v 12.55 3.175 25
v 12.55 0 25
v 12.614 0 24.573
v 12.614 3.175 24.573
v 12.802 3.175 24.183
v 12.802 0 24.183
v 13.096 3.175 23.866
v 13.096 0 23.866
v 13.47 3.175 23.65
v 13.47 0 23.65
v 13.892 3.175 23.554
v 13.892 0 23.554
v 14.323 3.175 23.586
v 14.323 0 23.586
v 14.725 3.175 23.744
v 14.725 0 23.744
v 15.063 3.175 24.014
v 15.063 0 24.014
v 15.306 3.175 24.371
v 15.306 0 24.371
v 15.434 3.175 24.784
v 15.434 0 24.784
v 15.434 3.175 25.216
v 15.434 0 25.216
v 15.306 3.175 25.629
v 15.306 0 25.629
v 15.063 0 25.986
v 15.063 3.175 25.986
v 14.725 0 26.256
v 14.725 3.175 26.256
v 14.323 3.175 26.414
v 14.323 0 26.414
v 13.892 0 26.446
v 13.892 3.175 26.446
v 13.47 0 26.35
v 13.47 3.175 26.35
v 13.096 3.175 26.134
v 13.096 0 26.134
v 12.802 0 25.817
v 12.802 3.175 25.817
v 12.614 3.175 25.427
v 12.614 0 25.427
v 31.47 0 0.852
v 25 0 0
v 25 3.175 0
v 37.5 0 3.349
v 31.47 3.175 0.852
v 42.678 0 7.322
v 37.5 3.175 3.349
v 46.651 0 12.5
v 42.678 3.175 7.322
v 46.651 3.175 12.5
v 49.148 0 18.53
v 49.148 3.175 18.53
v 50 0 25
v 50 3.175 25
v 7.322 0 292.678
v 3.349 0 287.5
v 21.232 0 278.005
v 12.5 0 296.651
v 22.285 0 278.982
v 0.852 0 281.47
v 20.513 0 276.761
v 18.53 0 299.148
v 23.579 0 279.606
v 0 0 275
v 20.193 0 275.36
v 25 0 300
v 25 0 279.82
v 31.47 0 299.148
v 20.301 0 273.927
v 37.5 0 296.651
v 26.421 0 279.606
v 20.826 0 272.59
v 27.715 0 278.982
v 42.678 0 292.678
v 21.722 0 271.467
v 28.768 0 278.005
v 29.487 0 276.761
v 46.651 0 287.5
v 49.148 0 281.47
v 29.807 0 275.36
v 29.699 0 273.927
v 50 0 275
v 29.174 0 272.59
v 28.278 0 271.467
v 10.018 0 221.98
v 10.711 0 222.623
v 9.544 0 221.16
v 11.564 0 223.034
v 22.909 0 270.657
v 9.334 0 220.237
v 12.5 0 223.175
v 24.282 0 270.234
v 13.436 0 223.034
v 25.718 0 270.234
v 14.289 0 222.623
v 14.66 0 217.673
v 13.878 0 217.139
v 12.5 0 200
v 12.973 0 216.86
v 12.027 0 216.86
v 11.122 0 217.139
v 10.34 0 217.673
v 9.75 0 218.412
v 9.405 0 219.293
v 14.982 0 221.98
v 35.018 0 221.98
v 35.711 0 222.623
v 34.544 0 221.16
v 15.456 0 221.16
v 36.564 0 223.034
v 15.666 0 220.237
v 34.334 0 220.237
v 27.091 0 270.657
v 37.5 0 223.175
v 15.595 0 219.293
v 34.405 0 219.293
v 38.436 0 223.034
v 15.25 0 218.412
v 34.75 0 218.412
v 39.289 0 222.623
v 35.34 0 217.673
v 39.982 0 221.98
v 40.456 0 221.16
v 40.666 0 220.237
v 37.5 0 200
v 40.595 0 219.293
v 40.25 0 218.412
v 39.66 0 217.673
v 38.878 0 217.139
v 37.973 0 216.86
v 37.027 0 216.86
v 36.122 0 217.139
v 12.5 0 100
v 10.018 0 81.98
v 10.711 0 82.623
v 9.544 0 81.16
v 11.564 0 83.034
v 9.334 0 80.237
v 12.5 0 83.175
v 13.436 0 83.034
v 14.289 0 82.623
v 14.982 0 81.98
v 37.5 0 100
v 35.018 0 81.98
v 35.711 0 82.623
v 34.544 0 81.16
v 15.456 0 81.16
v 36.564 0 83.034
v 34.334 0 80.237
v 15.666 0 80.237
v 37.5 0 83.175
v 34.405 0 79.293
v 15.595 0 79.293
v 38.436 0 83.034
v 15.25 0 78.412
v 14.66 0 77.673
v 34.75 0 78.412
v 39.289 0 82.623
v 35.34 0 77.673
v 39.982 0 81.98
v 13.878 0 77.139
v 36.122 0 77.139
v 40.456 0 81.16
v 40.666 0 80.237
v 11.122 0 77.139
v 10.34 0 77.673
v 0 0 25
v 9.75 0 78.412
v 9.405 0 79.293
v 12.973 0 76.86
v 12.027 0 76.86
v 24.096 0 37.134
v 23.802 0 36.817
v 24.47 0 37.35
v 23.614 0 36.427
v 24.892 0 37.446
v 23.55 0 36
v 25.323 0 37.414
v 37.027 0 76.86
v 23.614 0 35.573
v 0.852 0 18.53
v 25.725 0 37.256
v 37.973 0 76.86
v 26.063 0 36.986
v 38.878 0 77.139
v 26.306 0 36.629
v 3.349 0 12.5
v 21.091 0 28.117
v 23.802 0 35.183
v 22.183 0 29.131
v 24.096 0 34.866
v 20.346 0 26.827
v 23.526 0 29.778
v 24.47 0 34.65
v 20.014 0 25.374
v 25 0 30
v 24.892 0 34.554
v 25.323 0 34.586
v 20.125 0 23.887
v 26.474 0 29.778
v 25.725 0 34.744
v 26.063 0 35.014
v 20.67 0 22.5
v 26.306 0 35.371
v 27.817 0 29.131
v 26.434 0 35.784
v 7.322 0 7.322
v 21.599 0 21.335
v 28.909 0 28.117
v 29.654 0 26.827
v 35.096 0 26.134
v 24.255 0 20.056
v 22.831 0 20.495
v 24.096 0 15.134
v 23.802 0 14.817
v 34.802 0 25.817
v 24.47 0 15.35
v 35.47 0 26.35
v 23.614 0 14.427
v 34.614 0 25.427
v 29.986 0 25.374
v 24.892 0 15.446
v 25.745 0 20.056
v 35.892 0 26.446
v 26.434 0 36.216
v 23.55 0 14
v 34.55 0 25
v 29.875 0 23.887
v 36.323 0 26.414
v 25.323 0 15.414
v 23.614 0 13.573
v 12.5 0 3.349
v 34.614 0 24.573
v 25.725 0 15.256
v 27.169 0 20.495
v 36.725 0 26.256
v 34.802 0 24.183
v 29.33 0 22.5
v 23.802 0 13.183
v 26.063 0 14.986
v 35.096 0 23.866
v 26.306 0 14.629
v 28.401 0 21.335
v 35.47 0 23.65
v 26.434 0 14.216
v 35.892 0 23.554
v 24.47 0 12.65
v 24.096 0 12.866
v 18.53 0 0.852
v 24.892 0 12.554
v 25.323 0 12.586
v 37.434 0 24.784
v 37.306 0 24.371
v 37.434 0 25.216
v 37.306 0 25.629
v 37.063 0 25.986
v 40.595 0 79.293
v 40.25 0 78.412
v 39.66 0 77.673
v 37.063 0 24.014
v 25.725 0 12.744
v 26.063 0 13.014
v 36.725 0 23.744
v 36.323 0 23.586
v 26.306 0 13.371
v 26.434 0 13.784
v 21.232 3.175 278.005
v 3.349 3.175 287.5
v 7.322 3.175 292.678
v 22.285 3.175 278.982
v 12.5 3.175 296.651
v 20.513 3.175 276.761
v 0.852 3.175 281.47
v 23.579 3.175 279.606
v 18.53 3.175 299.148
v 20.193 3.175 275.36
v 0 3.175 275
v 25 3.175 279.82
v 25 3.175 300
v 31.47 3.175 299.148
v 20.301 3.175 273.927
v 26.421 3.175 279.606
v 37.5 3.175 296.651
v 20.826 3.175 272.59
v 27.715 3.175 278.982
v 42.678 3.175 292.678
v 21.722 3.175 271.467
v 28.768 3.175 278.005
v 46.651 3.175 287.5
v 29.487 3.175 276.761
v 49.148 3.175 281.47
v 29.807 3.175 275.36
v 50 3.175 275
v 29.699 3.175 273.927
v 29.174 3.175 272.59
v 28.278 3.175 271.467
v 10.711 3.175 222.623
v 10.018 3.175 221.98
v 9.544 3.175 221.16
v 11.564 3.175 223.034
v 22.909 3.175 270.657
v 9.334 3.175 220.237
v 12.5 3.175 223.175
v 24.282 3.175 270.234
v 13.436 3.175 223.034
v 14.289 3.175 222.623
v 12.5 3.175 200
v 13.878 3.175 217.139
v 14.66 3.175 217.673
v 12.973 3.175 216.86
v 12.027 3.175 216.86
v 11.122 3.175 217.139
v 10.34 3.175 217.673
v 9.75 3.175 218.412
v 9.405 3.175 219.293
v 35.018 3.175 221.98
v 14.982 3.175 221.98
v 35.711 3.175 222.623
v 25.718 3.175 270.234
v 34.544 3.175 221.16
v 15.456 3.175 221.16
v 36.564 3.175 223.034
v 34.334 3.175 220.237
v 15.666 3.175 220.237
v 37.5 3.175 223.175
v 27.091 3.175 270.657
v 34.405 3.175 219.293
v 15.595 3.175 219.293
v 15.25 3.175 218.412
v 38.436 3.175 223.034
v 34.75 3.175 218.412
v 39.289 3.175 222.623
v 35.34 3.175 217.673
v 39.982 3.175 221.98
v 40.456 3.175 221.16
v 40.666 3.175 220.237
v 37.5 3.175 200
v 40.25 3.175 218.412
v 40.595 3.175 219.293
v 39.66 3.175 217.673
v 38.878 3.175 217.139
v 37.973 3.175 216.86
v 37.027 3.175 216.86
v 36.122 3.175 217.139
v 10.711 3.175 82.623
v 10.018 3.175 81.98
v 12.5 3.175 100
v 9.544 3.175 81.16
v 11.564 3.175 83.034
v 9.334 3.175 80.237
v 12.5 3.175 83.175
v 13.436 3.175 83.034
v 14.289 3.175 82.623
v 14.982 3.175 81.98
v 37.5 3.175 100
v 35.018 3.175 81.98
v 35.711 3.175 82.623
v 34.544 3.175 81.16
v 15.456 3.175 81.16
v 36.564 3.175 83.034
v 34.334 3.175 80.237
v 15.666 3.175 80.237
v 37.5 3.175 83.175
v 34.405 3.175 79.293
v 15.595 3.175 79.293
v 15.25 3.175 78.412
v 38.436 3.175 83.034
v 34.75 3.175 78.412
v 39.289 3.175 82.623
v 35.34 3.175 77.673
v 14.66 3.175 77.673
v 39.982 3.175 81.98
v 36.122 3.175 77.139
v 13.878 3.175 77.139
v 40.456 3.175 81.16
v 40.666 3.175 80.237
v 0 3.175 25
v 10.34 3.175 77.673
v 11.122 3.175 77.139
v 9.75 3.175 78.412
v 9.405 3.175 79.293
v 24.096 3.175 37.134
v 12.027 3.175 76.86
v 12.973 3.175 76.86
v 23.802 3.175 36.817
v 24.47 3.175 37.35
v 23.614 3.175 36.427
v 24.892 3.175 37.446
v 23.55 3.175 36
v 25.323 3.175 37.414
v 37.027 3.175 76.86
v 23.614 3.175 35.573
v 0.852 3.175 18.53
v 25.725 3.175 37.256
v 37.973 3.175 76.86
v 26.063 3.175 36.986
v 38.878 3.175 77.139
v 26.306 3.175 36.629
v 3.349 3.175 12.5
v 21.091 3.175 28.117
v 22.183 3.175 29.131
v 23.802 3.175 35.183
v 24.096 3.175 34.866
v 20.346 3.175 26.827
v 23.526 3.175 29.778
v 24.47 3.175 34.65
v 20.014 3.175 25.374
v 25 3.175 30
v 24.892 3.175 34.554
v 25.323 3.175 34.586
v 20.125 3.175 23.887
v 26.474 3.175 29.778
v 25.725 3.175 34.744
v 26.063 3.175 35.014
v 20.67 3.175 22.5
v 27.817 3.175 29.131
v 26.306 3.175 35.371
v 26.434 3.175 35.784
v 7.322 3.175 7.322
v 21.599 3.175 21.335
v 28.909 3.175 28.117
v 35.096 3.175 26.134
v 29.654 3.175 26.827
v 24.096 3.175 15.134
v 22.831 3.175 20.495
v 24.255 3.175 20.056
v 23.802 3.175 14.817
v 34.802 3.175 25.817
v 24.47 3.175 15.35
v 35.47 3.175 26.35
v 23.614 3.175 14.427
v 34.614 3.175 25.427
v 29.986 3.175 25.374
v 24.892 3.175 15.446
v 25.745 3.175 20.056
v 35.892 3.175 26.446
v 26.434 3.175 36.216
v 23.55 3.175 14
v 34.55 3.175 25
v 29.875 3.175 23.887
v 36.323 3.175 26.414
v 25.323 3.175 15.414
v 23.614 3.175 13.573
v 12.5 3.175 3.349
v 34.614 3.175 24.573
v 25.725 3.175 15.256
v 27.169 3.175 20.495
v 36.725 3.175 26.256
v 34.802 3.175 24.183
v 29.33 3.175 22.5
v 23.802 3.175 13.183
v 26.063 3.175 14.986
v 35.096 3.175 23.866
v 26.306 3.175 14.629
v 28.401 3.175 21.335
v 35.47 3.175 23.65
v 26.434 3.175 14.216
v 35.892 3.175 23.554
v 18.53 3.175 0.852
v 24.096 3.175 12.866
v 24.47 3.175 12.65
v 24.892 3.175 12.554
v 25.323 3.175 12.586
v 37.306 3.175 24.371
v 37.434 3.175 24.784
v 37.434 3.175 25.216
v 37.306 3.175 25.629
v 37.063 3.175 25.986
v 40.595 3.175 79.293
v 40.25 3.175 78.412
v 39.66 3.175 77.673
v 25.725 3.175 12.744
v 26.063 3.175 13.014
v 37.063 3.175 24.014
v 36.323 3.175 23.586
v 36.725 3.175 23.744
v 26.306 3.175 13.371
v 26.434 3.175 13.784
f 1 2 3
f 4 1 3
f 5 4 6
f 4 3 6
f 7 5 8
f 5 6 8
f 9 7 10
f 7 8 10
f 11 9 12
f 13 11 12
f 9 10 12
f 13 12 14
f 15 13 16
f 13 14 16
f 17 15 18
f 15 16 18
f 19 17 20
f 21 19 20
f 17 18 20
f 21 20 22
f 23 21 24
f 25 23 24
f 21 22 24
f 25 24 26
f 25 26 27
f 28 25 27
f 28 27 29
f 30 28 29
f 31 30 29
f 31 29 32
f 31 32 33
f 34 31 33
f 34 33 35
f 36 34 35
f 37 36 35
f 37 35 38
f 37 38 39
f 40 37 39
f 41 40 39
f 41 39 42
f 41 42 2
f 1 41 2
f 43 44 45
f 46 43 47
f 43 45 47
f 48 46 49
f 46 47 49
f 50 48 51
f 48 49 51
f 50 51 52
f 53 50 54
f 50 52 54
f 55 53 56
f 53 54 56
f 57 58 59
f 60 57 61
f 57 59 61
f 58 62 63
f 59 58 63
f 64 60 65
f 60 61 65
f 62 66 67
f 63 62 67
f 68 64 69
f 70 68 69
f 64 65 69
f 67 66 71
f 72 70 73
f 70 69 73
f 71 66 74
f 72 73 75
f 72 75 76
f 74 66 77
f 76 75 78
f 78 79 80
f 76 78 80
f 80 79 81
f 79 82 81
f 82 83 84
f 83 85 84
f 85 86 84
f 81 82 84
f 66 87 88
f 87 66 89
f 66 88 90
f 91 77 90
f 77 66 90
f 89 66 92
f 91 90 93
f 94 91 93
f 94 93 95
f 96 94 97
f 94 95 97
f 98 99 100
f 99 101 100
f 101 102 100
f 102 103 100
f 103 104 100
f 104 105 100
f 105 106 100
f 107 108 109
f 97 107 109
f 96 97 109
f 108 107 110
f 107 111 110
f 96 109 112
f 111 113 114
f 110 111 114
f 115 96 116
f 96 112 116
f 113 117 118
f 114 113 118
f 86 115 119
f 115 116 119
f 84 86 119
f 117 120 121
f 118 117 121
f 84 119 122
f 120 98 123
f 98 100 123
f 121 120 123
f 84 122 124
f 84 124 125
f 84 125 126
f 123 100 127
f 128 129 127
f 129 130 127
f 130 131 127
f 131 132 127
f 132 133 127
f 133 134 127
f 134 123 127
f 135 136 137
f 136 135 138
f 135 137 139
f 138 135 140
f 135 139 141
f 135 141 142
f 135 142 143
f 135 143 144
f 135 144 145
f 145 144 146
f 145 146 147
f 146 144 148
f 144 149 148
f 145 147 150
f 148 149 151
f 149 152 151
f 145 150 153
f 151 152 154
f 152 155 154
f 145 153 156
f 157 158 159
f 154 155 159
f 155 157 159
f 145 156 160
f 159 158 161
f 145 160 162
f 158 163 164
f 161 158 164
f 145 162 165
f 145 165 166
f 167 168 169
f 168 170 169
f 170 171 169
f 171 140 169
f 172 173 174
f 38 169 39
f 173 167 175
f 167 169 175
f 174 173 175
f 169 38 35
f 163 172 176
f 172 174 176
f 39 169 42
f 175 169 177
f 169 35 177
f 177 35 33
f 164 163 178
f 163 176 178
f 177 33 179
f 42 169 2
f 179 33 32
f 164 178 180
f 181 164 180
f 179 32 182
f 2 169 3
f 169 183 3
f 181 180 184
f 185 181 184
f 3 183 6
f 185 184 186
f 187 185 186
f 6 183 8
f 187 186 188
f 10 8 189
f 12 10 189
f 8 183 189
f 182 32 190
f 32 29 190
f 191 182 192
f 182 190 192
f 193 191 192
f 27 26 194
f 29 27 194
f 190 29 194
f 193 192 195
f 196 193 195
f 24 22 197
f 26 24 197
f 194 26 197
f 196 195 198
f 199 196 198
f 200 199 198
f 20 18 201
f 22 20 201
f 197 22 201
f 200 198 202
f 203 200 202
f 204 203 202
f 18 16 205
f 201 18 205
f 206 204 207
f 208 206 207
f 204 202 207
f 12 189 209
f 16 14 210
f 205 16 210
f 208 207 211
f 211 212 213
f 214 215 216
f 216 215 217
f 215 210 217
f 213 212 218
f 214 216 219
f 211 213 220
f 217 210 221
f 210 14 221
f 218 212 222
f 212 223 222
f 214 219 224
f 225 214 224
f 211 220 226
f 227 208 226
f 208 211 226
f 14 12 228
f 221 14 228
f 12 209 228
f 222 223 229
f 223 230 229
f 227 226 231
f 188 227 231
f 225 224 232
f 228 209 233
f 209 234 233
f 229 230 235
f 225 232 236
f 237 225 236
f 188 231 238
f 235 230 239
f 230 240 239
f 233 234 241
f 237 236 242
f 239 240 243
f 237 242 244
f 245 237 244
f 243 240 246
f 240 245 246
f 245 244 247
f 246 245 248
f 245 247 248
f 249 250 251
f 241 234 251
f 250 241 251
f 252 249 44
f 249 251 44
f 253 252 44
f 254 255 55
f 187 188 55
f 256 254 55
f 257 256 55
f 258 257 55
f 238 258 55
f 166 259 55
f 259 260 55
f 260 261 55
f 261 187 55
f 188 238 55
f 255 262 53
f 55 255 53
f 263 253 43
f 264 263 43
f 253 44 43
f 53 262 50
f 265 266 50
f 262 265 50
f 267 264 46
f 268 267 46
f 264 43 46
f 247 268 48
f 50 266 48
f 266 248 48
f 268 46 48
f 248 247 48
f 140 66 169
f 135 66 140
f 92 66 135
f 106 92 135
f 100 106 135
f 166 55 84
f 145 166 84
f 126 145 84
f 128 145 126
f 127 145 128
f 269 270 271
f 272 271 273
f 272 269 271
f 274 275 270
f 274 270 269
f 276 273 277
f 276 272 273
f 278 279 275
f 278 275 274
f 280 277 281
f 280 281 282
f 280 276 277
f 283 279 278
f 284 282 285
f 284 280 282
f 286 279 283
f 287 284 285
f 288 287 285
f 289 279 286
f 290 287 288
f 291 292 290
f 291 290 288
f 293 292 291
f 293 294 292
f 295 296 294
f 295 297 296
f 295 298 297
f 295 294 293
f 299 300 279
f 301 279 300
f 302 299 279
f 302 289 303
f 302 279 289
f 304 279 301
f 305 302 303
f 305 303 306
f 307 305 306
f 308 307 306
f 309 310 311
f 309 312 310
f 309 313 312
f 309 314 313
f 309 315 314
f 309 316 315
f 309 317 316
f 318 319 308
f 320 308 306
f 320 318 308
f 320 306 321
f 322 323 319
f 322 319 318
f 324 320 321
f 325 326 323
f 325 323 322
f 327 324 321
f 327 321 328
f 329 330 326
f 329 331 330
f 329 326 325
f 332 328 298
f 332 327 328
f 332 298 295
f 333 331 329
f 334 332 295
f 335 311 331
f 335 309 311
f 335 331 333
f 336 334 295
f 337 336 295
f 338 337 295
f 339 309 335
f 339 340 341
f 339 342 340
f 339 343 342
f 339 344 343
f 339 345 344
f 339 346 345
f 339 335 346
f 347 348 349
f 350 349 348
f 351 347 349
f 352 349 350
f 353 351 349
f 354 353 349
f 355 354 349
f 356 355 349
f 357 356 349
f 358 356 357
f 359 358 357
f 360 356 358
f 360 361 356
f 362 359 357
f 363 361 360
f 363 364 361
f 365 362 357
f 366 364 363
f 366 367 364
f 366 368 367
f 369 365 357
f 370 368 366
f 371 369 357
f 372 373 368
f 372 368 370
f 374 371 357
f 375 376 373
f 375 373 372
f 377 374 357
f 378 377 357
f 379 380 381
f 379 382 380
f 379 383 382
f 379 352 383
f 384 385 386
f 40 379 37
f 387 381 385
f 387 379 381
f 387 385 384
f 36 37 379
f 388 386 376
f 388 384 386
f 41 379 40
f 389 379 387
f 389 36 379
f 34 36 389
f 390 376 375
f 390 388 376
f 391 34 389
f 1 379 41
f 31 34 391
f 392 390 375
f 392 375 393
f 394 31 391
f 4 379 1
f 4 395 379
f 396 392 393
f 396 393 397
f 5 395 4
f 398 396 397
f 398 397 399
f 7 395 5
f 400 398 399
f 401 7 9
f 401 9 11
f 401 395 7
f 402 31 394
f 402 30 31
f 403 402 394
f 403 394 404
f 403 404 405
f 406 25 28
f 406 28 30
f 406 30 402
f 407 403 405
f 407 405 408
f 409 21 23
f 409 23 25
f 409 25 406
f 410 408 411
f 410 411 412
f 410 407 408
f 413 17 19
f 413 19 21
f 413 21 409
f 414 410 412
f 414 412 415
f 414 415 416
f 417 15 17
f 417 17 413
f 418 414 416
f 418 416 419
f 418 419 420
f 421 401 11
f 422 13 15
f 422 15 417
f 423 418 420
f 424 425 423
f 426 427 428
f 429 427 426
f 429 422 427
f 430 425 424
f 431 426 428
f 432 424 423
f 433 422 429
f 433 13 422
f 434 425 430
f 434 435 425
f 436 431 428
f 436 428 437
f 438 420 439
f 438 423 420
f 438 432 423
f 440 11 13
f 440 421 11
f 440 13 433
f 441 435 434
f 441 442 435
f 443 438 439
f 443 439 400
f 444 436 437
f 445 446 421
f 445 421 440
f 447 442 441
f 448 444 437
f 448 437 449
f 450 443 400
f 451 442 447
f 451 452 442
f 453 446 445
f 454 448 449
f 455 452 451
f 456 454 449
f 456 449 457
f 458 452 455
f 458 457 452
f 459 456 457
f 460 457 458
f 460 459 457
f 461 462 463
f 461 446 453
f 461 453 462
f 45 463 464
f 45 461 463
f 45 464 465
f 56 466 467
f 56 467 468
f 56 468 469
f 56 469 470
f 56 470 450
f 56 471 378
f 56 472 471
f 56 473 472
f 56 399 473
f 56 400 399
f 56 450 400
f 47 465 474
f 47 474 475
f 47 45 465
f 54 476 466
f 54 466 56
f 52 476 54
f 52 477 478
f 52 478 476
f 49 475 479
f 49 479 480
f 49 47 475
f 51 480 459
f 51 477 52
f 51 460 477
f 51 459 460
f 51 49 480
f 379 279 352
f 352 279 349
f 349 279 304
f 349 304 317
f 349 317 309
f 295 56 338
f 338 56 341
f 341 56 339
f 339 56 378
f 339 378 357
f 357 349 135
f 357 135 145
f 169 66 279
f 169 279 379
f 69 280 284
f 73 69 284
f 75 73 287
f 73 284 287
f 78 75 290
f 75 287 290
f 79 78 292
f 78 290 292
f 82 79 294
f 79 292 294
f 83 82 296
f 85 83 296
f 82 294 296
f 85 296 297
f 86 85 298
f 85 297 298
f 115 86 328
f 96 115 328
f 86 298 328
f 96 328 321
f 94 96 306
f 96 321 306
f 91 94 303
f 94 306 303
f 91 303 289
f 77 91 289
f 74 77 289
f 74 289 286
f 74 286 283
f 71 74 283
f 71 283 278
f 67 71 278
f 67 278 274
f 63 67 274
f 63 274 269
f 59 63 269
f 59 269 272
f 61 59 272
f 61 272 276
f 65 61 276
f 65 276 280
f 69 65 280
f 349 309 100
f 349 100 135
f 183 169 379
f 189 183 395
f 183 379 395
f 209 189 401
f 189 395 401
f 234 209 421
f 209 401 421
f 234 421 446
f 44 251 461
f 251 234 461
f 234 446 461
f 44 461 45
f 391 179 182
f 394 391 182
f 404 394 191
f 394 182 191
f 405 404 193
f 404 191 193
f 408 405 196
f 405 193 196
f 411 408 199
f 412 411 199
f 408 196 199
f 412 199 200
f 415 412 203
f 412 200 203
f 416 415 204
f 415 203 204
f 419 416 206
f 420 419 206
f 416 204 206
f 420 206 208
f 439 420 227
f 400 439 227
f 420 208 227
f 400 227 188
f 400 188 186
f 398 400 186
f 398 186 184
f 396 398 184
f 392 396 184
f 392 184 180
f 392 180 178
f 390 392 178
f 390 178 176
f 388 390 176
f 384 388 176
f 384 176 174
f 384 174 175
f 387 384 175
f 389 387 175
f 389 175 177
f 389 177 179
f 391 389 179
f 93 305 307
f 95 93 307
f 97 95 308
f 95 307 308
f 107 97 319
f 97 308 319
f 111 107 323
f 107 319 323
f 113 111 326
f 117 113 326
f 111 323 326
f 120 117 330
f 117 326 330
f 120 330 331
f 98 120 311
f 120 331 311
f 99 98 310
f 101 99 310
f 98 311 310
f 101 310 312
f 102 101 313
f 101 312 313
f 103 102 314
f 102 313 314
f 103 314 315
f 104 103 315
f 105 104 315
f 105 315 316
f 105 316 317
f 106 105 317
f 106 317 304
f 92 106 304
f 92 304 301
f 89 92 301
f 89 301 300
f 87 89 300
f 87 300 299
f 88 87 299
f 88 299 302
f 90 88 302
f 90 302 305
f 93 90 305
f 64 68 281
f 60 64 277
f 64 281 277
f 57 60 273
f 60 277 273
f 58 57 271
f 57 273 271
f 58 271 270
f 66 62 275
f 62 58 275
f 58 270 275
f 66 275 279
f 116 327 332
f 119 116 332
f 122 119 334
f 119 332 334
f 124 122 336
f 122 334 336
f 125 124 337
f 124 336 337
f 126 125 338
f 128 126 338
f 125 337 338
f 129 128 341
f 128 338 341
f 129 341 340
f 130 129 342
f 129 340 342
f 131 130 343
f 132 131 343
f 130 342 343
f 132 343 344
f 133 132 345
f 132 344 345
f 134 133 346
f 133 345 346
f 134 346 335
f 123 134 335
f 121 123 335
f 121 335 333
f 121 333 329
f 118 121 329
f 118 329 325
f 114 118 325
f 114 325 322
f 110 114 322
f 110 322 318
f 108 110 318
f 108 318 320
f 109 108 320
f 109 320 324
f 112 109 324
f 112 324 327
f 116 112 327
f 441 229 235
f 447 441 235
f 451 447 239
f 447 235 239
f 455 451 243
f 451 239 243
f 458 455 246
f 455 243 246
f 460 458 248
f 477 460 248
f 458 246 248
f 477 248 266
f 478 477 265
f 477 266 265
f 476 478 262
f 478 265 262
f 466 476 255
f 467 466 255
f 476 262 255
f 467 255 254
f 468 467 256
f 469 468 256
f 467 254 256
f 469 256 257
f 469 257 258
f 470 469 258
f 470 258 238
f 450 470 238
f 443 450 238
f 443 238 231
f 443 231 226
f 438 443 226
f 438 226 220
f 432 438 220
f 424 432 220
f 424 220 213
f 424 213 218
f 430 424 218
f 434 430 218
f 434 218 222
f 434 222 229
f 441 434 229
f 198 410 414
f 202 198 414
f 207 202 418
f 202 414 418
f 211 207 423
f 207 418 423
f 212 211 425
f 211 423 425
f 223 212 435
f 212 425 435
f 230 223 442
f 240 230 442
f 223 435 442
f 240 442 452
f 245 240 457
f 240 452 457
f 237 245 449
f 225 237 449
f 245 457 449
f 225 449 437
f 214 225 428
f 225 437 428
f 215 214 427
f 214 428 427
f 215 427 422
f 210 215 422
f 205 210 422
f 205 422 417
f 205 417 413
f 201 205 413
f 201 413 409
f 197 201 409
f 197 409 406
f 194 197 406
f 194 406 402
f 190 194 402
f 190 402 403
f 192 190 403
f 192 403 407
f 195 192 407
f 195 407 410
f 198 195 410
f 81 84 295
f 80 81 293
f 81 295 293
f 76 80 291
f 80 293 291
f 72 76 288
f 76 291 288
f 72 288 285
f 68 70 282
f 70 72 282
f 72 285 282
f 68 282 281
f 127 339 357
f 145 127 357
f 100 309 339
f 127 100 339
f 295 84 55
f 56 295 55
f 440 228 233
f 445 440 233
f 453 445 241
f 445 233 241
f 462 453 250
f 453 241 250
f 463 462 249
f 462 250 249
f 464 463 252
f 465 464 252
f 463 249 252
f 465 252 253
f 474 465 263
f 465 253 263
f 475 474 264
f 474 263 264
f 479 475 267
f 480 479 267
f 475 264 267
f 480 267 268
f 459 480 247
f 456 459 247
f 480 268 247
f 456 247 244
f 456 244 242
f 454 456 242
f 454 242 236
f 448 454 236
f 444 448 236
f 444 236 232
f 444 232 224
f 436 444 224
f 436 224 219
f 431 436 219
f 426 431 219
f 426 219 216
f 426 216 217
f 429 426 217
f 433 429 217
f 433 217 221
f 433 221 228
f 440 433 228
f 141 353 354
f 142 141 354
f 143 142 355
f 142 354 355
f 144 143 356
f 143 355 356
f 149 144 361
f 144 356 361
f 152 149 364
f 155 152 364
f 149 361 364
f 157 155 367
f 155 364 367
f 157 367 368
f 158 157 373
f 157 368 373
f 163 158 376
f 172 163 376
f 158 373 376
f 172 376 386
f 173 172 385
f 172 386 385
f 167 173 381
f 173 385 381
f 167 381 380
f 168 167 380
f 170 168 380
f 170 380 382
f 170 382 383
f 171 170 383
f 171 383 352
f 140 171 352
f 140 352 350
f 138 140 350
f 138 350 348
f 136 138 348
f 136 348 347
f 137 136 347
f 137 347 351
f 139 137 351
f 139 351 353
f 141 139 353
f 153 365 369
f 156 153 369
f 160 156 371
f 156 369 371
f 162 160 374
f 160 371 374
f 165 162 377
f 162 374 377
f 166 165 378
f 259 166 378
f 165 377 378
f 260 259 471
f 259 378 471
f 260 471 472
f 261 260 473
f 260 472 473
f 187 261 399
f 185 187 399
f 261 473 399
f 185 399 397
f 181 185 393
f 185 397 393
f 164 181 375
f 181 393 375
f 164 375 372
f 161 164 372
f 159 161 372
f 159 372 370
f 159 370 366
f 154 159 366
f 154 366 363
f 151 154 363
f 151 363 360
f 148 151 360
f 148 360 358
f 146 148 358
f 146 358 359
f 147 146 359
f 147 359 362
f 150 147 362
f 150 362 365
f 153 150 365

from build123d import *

# Parameters (mm, degrees)
SKETCH1_W              = 50
SKETCH1_H              = 300
BOSS_EXTRUDE1_DEPTH    = 3.175
CUT_EXTRUDE1_DEPTH     = 6.35
SKETCH3_R              = 5
SKETCH3_R_2            = 4.82
SKETCH3_R_3            = 1.025
CUT_EXTRUDE2_DEPTH     = 6.35
SKETCH4_R              = 3.175
SKETCH4_W              = 25
SKETCH4_H              = 100
CUT_EXTRUDE3_DEPTH     = 6.35
M2_5_CLEARANCE_HOLE1_D = 2.9


with BuildPart() as part:
    # Sketch1 → Boss-Extrude1 (new body)
    with BuildSketch(Plane(origin=(0, 0, 0), x_dir=(1, 0, 0), z_dir=(0, 1, 0))):
        with Locations((25, -150)):
            Rectangle(SKETCH1_W, SKETCH1_H)
    extrude(amount=BOSS_EXTRUDE1_DEPTH)

    # Sketch2 → Cut-Extrude1 (cut)
    with BuildSketch(Plane(origin=(0, 3.175, 0), x_dir=(1, 0, 0), z_dir=(0, 1, 0))):
        with BuildLine():
            ThreePointArc((25, 0), (42.67766953, -7.32233047), (50, -25))
            Line((50, -25), (50, 0))
            Line((50, 0), (25, 0))
        make_face()
        with BuildLine():
            Line((0, 0), (0, -25))
            ThreePointArc((0, -25), (7.32233047, -7.32233047), (25, 0))
            Line((25, 0), (0, 0))
        make_face()
        with BuildLine():
            Line((50, -300), (50, -275))
            ThreePointArc((50, -275), (42.67766953, -292.67766953), (25, -300))
            Line((25, -300), (50, -300))
        make_face()
        with BuildLine():
            ThreePointArc((25, -300), (7.32233047, -292.67766953), (0, -275))
            Line((0, -275), (0, -300))
            Line((0, -300), (25, -300))
        make_face()
    extrude(amount=-CUT_EXTRUDE1_DEPTH, mode=Mode.SUBTRACT)

    # Sketch3 → Cut-Extrude2 (cut)
    with BuildSketch(Plane(origin=(0, 3.175, 0), x_dir=(1, 0, 0), z_dir=(0, 1, 0))):
        with Locations(Location((25, -25, 0), (0, 0, 270))):
            Circle(SKETCH3_R)
        with Locations(Location((25, -275, 0), (0, 0, 270))):
            Circle(SKETCH3_R_2)
        with Locations(Location((25, -14, 0), (0, 0, 270))):
            Circle(SKETCH3_R_3)
        with Locations(Location((14, -25, 0), (0, 0, 270))):
            Circle(SKETCH3_R_3)
        with Locations(Location((25, -36, 0), (0, 0, 270))):
            Circle(SKETCH3_R_3)
        with Locations(Location((36, -25, 0), (0, 0, 270))):
            Circle(SKETCH3_R_3)
    extrude(amount=-CUT_EXTRUDE2_DEPTH, mode=Mode.SUBTRACT)

    # Sketch4 → Cut-Extrude3 (cut)
    with BuildSketch(Plane(origin=(0, 3.175, 0), x_dir=(1, 0, 0), z_dir=(0, 1, 0))):
        with Locations(Location((12.5, -80, 0), (0, 0, 270))):
            Circle(SKETCH4_R)
        with Locations(Location((12.5, -220, 0), (0, 0, 270))):
            Circle(SKETCH4_R)
        with Locations(Location((37.5, -220, 0), (0, 0, 270))):
            Circle(SKETCH4_R)
        with Locations(Location((37.5, -80, 0), (0, 0, 270))):
            Circle(SKETCH4_R)
        with Locations((25, -150)):
            Rectangle(SKETCH4_W, SKETCH4_H)
    extrude(amount=-CUT_EXTRUDE3_DEPTH, mode=Mode.SUBTRACT)

    # M2.5 Clearance Hole1 (through all)
    with Locations(Plane(origin=(0, 3.175, 0), x_dir=(1, 0, 0), z_dir=(0, 1, 0))):
        with Locations((14, -25), (25, -14), (36, -25), (25, -36)):
            Hole(M2_5_CLEARANCE_HOLE1_D / 2)


solid = part.part
